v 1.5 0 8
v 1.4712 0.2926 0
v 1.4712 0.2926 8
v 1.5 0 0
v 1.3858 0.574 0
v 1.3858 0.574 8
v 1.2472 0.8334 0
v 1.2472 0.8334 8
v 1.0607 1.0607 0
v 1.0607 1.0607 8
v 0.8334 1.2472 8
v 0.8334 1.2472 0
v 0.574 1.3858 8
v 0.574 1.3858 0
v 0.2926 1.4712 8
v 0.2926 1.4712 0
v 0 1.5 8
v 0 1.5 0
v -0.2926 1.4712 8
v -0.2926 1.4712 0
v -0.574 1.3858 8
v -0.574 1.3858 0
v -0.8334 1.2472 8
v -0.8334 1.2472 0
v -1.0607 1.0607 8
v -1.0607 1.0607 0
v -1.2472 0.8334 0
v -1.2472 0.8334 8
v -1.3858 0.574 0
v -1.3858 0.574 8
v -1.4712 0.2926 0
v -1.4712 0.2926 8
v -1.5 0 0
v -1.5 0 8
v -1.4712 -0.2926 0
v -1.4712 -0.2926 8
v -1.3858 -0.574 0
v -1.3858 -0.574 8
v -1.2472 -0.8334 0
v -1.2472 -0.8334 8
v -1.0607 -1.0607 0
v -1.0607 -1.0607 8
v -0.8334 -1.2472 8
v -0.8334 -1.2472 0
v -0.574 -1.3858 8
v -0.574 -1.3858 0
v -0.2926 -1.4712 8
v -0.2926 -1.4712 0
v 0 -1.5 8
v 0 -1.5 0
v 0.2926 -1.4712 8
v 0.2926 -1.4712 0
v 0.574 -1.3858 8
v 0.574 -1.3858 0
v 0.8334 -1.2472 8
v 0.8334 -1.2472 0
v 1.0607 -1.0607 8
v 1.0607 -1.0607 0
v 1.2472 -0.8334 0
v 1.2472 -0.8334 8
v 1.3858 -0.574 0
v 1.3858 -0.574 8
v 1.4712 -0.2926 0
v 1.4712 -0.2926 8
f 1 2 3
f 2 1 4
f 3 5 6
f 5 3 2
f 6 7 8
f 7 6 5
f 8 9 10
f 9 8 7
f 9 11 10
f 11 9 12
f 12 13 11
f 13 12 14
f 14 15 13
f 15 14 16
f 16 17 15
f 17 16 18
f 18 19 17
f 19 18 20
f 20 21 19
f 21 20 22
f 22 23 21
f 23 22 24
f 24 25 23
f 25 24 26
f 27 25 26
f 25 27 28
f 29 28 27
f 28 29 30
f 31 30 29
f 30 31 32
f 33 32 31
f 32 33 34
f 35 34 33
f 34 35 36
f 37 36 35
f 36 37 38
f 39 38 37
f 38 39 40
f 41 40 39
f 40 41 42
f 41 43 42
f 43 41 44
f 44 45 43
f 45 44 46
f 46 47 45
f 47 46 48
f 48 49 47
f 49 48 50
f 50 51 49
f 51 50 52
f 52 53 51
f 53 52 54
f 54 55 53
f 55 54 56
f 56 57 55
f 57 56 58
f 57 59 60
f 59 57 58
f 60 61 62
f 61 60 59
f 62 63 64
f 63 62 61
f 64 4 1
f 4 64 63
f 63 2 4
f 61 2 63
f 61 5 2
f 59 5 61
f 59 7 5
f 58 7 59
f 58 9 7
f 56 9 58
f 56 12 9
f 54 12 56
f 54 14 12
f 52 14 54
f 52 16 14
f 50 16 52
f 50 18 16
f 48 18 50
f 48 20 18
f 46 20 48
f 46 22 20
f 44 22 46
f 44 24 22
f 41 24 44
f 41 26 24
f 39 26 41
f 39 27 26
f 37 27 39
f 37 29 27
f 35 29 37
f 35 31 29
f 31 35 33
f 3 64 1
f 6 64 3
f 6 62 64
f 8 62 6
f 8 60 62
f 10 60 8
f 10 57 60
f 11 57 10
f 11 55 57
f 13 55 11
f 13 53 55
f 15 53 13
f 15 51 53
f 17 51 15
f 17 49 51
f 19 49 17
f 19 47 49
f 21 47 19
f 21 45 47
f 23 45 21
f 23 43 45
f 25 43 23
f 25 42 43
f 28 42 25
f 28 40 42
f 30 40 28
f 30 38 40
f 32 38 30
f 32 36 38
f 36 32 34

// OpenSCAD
// Purchased M3 metal headless set screw / threaded stud, smooth envelope only.
// Origin = lower end; cylinder extends +Z. Placement supplies the protrusion.
length=8;
diameter=3;
assert(length>0 && diameter>0);
cylinder(d=diameter,h=length,$fn=32,center=false);
